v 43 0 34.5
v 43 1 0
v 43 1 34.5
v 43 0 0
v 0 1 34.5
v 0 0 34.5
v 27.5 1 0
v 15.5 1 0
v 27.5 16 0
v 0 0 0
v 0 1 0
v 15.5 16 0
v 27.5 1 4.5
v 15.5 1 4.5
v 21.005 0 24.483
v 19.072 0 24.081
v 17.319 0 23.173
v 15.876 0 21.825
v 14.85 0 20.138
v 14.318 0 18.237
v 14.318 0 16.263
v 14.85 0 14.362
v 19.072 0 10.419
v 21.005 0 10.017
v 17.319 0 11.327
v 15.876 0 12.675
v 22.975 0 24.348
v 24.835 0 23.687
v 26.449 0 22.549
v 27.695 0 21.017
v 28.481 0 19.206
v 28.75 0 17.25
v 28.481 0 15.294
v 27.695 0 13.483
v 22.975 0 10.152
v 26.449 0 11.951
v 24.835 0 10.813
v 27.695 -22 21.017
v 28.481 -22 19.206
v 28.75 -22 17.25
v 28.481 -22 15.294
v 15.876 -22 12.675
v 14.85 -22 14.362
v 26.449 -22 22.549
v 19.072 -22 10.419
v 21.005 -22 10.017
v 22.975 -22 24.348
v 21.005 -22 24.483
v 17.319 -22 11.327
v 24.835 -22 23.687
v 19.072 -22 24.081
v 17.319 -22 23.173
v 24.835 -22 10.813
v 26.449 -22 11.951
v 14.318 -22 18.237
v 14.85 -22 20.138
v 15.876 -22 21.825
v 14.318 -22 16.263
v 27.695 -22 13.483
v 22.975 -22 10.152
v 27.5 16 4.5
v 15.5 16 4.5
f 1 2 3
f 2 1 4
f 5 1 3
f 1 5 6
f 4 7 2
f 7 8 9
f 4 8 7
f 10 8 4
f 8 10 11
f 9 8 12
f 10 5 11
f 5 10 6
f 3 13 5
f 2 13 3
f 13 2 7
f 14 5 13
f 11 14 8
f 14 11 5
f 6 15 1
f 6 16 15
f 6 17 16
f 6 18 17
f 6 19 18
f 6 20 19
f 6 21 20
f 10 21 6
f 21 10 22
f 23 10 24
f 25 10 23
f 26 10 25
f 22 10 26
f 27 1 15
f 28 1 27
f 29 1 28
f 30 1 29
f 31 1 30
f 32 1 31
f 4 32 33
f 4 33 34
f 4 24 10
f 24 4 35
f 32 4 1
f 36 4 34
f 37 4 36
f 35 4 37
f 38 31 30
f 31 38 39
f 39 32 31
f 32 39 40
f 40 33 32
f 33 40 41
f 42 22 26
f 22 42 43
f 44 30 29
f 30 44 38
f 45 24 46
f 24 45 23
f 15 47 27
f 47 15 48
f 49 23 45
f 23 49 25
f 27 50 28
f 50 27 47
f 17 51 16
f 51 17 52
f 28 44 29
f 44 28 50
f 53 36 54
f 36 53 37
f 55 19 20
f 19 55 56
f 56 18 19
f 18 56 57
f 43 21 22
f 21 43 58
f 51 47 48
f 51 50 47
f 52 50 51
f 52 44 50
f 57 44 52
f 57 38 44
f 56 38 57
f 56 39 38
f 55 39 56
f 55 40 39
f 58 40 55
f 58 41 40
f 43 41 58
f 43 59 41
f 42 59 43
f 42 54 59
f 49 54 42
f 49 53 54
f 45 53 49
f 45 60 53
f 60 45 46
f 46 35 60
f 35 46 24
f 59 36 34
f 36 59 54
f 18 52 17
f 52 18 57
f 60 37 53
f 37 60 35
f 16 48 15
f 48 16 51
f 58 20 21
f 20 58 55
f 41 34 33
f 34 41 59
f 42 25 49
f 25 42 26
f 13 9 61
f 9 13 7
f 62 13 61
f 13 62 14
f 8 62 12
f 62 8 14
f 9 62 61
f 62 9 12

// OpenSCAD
module cammera()
{
  cube([43, 1, 34.5]);
  translate([43/2, 0, 34.5/2])
    rotate([90, 0, 0])
      cylinder(r=14.5/2, h=22);
  translate([(43-12)/2, 1])
    cube([12, 15, 4.5]);
}

cammera();
